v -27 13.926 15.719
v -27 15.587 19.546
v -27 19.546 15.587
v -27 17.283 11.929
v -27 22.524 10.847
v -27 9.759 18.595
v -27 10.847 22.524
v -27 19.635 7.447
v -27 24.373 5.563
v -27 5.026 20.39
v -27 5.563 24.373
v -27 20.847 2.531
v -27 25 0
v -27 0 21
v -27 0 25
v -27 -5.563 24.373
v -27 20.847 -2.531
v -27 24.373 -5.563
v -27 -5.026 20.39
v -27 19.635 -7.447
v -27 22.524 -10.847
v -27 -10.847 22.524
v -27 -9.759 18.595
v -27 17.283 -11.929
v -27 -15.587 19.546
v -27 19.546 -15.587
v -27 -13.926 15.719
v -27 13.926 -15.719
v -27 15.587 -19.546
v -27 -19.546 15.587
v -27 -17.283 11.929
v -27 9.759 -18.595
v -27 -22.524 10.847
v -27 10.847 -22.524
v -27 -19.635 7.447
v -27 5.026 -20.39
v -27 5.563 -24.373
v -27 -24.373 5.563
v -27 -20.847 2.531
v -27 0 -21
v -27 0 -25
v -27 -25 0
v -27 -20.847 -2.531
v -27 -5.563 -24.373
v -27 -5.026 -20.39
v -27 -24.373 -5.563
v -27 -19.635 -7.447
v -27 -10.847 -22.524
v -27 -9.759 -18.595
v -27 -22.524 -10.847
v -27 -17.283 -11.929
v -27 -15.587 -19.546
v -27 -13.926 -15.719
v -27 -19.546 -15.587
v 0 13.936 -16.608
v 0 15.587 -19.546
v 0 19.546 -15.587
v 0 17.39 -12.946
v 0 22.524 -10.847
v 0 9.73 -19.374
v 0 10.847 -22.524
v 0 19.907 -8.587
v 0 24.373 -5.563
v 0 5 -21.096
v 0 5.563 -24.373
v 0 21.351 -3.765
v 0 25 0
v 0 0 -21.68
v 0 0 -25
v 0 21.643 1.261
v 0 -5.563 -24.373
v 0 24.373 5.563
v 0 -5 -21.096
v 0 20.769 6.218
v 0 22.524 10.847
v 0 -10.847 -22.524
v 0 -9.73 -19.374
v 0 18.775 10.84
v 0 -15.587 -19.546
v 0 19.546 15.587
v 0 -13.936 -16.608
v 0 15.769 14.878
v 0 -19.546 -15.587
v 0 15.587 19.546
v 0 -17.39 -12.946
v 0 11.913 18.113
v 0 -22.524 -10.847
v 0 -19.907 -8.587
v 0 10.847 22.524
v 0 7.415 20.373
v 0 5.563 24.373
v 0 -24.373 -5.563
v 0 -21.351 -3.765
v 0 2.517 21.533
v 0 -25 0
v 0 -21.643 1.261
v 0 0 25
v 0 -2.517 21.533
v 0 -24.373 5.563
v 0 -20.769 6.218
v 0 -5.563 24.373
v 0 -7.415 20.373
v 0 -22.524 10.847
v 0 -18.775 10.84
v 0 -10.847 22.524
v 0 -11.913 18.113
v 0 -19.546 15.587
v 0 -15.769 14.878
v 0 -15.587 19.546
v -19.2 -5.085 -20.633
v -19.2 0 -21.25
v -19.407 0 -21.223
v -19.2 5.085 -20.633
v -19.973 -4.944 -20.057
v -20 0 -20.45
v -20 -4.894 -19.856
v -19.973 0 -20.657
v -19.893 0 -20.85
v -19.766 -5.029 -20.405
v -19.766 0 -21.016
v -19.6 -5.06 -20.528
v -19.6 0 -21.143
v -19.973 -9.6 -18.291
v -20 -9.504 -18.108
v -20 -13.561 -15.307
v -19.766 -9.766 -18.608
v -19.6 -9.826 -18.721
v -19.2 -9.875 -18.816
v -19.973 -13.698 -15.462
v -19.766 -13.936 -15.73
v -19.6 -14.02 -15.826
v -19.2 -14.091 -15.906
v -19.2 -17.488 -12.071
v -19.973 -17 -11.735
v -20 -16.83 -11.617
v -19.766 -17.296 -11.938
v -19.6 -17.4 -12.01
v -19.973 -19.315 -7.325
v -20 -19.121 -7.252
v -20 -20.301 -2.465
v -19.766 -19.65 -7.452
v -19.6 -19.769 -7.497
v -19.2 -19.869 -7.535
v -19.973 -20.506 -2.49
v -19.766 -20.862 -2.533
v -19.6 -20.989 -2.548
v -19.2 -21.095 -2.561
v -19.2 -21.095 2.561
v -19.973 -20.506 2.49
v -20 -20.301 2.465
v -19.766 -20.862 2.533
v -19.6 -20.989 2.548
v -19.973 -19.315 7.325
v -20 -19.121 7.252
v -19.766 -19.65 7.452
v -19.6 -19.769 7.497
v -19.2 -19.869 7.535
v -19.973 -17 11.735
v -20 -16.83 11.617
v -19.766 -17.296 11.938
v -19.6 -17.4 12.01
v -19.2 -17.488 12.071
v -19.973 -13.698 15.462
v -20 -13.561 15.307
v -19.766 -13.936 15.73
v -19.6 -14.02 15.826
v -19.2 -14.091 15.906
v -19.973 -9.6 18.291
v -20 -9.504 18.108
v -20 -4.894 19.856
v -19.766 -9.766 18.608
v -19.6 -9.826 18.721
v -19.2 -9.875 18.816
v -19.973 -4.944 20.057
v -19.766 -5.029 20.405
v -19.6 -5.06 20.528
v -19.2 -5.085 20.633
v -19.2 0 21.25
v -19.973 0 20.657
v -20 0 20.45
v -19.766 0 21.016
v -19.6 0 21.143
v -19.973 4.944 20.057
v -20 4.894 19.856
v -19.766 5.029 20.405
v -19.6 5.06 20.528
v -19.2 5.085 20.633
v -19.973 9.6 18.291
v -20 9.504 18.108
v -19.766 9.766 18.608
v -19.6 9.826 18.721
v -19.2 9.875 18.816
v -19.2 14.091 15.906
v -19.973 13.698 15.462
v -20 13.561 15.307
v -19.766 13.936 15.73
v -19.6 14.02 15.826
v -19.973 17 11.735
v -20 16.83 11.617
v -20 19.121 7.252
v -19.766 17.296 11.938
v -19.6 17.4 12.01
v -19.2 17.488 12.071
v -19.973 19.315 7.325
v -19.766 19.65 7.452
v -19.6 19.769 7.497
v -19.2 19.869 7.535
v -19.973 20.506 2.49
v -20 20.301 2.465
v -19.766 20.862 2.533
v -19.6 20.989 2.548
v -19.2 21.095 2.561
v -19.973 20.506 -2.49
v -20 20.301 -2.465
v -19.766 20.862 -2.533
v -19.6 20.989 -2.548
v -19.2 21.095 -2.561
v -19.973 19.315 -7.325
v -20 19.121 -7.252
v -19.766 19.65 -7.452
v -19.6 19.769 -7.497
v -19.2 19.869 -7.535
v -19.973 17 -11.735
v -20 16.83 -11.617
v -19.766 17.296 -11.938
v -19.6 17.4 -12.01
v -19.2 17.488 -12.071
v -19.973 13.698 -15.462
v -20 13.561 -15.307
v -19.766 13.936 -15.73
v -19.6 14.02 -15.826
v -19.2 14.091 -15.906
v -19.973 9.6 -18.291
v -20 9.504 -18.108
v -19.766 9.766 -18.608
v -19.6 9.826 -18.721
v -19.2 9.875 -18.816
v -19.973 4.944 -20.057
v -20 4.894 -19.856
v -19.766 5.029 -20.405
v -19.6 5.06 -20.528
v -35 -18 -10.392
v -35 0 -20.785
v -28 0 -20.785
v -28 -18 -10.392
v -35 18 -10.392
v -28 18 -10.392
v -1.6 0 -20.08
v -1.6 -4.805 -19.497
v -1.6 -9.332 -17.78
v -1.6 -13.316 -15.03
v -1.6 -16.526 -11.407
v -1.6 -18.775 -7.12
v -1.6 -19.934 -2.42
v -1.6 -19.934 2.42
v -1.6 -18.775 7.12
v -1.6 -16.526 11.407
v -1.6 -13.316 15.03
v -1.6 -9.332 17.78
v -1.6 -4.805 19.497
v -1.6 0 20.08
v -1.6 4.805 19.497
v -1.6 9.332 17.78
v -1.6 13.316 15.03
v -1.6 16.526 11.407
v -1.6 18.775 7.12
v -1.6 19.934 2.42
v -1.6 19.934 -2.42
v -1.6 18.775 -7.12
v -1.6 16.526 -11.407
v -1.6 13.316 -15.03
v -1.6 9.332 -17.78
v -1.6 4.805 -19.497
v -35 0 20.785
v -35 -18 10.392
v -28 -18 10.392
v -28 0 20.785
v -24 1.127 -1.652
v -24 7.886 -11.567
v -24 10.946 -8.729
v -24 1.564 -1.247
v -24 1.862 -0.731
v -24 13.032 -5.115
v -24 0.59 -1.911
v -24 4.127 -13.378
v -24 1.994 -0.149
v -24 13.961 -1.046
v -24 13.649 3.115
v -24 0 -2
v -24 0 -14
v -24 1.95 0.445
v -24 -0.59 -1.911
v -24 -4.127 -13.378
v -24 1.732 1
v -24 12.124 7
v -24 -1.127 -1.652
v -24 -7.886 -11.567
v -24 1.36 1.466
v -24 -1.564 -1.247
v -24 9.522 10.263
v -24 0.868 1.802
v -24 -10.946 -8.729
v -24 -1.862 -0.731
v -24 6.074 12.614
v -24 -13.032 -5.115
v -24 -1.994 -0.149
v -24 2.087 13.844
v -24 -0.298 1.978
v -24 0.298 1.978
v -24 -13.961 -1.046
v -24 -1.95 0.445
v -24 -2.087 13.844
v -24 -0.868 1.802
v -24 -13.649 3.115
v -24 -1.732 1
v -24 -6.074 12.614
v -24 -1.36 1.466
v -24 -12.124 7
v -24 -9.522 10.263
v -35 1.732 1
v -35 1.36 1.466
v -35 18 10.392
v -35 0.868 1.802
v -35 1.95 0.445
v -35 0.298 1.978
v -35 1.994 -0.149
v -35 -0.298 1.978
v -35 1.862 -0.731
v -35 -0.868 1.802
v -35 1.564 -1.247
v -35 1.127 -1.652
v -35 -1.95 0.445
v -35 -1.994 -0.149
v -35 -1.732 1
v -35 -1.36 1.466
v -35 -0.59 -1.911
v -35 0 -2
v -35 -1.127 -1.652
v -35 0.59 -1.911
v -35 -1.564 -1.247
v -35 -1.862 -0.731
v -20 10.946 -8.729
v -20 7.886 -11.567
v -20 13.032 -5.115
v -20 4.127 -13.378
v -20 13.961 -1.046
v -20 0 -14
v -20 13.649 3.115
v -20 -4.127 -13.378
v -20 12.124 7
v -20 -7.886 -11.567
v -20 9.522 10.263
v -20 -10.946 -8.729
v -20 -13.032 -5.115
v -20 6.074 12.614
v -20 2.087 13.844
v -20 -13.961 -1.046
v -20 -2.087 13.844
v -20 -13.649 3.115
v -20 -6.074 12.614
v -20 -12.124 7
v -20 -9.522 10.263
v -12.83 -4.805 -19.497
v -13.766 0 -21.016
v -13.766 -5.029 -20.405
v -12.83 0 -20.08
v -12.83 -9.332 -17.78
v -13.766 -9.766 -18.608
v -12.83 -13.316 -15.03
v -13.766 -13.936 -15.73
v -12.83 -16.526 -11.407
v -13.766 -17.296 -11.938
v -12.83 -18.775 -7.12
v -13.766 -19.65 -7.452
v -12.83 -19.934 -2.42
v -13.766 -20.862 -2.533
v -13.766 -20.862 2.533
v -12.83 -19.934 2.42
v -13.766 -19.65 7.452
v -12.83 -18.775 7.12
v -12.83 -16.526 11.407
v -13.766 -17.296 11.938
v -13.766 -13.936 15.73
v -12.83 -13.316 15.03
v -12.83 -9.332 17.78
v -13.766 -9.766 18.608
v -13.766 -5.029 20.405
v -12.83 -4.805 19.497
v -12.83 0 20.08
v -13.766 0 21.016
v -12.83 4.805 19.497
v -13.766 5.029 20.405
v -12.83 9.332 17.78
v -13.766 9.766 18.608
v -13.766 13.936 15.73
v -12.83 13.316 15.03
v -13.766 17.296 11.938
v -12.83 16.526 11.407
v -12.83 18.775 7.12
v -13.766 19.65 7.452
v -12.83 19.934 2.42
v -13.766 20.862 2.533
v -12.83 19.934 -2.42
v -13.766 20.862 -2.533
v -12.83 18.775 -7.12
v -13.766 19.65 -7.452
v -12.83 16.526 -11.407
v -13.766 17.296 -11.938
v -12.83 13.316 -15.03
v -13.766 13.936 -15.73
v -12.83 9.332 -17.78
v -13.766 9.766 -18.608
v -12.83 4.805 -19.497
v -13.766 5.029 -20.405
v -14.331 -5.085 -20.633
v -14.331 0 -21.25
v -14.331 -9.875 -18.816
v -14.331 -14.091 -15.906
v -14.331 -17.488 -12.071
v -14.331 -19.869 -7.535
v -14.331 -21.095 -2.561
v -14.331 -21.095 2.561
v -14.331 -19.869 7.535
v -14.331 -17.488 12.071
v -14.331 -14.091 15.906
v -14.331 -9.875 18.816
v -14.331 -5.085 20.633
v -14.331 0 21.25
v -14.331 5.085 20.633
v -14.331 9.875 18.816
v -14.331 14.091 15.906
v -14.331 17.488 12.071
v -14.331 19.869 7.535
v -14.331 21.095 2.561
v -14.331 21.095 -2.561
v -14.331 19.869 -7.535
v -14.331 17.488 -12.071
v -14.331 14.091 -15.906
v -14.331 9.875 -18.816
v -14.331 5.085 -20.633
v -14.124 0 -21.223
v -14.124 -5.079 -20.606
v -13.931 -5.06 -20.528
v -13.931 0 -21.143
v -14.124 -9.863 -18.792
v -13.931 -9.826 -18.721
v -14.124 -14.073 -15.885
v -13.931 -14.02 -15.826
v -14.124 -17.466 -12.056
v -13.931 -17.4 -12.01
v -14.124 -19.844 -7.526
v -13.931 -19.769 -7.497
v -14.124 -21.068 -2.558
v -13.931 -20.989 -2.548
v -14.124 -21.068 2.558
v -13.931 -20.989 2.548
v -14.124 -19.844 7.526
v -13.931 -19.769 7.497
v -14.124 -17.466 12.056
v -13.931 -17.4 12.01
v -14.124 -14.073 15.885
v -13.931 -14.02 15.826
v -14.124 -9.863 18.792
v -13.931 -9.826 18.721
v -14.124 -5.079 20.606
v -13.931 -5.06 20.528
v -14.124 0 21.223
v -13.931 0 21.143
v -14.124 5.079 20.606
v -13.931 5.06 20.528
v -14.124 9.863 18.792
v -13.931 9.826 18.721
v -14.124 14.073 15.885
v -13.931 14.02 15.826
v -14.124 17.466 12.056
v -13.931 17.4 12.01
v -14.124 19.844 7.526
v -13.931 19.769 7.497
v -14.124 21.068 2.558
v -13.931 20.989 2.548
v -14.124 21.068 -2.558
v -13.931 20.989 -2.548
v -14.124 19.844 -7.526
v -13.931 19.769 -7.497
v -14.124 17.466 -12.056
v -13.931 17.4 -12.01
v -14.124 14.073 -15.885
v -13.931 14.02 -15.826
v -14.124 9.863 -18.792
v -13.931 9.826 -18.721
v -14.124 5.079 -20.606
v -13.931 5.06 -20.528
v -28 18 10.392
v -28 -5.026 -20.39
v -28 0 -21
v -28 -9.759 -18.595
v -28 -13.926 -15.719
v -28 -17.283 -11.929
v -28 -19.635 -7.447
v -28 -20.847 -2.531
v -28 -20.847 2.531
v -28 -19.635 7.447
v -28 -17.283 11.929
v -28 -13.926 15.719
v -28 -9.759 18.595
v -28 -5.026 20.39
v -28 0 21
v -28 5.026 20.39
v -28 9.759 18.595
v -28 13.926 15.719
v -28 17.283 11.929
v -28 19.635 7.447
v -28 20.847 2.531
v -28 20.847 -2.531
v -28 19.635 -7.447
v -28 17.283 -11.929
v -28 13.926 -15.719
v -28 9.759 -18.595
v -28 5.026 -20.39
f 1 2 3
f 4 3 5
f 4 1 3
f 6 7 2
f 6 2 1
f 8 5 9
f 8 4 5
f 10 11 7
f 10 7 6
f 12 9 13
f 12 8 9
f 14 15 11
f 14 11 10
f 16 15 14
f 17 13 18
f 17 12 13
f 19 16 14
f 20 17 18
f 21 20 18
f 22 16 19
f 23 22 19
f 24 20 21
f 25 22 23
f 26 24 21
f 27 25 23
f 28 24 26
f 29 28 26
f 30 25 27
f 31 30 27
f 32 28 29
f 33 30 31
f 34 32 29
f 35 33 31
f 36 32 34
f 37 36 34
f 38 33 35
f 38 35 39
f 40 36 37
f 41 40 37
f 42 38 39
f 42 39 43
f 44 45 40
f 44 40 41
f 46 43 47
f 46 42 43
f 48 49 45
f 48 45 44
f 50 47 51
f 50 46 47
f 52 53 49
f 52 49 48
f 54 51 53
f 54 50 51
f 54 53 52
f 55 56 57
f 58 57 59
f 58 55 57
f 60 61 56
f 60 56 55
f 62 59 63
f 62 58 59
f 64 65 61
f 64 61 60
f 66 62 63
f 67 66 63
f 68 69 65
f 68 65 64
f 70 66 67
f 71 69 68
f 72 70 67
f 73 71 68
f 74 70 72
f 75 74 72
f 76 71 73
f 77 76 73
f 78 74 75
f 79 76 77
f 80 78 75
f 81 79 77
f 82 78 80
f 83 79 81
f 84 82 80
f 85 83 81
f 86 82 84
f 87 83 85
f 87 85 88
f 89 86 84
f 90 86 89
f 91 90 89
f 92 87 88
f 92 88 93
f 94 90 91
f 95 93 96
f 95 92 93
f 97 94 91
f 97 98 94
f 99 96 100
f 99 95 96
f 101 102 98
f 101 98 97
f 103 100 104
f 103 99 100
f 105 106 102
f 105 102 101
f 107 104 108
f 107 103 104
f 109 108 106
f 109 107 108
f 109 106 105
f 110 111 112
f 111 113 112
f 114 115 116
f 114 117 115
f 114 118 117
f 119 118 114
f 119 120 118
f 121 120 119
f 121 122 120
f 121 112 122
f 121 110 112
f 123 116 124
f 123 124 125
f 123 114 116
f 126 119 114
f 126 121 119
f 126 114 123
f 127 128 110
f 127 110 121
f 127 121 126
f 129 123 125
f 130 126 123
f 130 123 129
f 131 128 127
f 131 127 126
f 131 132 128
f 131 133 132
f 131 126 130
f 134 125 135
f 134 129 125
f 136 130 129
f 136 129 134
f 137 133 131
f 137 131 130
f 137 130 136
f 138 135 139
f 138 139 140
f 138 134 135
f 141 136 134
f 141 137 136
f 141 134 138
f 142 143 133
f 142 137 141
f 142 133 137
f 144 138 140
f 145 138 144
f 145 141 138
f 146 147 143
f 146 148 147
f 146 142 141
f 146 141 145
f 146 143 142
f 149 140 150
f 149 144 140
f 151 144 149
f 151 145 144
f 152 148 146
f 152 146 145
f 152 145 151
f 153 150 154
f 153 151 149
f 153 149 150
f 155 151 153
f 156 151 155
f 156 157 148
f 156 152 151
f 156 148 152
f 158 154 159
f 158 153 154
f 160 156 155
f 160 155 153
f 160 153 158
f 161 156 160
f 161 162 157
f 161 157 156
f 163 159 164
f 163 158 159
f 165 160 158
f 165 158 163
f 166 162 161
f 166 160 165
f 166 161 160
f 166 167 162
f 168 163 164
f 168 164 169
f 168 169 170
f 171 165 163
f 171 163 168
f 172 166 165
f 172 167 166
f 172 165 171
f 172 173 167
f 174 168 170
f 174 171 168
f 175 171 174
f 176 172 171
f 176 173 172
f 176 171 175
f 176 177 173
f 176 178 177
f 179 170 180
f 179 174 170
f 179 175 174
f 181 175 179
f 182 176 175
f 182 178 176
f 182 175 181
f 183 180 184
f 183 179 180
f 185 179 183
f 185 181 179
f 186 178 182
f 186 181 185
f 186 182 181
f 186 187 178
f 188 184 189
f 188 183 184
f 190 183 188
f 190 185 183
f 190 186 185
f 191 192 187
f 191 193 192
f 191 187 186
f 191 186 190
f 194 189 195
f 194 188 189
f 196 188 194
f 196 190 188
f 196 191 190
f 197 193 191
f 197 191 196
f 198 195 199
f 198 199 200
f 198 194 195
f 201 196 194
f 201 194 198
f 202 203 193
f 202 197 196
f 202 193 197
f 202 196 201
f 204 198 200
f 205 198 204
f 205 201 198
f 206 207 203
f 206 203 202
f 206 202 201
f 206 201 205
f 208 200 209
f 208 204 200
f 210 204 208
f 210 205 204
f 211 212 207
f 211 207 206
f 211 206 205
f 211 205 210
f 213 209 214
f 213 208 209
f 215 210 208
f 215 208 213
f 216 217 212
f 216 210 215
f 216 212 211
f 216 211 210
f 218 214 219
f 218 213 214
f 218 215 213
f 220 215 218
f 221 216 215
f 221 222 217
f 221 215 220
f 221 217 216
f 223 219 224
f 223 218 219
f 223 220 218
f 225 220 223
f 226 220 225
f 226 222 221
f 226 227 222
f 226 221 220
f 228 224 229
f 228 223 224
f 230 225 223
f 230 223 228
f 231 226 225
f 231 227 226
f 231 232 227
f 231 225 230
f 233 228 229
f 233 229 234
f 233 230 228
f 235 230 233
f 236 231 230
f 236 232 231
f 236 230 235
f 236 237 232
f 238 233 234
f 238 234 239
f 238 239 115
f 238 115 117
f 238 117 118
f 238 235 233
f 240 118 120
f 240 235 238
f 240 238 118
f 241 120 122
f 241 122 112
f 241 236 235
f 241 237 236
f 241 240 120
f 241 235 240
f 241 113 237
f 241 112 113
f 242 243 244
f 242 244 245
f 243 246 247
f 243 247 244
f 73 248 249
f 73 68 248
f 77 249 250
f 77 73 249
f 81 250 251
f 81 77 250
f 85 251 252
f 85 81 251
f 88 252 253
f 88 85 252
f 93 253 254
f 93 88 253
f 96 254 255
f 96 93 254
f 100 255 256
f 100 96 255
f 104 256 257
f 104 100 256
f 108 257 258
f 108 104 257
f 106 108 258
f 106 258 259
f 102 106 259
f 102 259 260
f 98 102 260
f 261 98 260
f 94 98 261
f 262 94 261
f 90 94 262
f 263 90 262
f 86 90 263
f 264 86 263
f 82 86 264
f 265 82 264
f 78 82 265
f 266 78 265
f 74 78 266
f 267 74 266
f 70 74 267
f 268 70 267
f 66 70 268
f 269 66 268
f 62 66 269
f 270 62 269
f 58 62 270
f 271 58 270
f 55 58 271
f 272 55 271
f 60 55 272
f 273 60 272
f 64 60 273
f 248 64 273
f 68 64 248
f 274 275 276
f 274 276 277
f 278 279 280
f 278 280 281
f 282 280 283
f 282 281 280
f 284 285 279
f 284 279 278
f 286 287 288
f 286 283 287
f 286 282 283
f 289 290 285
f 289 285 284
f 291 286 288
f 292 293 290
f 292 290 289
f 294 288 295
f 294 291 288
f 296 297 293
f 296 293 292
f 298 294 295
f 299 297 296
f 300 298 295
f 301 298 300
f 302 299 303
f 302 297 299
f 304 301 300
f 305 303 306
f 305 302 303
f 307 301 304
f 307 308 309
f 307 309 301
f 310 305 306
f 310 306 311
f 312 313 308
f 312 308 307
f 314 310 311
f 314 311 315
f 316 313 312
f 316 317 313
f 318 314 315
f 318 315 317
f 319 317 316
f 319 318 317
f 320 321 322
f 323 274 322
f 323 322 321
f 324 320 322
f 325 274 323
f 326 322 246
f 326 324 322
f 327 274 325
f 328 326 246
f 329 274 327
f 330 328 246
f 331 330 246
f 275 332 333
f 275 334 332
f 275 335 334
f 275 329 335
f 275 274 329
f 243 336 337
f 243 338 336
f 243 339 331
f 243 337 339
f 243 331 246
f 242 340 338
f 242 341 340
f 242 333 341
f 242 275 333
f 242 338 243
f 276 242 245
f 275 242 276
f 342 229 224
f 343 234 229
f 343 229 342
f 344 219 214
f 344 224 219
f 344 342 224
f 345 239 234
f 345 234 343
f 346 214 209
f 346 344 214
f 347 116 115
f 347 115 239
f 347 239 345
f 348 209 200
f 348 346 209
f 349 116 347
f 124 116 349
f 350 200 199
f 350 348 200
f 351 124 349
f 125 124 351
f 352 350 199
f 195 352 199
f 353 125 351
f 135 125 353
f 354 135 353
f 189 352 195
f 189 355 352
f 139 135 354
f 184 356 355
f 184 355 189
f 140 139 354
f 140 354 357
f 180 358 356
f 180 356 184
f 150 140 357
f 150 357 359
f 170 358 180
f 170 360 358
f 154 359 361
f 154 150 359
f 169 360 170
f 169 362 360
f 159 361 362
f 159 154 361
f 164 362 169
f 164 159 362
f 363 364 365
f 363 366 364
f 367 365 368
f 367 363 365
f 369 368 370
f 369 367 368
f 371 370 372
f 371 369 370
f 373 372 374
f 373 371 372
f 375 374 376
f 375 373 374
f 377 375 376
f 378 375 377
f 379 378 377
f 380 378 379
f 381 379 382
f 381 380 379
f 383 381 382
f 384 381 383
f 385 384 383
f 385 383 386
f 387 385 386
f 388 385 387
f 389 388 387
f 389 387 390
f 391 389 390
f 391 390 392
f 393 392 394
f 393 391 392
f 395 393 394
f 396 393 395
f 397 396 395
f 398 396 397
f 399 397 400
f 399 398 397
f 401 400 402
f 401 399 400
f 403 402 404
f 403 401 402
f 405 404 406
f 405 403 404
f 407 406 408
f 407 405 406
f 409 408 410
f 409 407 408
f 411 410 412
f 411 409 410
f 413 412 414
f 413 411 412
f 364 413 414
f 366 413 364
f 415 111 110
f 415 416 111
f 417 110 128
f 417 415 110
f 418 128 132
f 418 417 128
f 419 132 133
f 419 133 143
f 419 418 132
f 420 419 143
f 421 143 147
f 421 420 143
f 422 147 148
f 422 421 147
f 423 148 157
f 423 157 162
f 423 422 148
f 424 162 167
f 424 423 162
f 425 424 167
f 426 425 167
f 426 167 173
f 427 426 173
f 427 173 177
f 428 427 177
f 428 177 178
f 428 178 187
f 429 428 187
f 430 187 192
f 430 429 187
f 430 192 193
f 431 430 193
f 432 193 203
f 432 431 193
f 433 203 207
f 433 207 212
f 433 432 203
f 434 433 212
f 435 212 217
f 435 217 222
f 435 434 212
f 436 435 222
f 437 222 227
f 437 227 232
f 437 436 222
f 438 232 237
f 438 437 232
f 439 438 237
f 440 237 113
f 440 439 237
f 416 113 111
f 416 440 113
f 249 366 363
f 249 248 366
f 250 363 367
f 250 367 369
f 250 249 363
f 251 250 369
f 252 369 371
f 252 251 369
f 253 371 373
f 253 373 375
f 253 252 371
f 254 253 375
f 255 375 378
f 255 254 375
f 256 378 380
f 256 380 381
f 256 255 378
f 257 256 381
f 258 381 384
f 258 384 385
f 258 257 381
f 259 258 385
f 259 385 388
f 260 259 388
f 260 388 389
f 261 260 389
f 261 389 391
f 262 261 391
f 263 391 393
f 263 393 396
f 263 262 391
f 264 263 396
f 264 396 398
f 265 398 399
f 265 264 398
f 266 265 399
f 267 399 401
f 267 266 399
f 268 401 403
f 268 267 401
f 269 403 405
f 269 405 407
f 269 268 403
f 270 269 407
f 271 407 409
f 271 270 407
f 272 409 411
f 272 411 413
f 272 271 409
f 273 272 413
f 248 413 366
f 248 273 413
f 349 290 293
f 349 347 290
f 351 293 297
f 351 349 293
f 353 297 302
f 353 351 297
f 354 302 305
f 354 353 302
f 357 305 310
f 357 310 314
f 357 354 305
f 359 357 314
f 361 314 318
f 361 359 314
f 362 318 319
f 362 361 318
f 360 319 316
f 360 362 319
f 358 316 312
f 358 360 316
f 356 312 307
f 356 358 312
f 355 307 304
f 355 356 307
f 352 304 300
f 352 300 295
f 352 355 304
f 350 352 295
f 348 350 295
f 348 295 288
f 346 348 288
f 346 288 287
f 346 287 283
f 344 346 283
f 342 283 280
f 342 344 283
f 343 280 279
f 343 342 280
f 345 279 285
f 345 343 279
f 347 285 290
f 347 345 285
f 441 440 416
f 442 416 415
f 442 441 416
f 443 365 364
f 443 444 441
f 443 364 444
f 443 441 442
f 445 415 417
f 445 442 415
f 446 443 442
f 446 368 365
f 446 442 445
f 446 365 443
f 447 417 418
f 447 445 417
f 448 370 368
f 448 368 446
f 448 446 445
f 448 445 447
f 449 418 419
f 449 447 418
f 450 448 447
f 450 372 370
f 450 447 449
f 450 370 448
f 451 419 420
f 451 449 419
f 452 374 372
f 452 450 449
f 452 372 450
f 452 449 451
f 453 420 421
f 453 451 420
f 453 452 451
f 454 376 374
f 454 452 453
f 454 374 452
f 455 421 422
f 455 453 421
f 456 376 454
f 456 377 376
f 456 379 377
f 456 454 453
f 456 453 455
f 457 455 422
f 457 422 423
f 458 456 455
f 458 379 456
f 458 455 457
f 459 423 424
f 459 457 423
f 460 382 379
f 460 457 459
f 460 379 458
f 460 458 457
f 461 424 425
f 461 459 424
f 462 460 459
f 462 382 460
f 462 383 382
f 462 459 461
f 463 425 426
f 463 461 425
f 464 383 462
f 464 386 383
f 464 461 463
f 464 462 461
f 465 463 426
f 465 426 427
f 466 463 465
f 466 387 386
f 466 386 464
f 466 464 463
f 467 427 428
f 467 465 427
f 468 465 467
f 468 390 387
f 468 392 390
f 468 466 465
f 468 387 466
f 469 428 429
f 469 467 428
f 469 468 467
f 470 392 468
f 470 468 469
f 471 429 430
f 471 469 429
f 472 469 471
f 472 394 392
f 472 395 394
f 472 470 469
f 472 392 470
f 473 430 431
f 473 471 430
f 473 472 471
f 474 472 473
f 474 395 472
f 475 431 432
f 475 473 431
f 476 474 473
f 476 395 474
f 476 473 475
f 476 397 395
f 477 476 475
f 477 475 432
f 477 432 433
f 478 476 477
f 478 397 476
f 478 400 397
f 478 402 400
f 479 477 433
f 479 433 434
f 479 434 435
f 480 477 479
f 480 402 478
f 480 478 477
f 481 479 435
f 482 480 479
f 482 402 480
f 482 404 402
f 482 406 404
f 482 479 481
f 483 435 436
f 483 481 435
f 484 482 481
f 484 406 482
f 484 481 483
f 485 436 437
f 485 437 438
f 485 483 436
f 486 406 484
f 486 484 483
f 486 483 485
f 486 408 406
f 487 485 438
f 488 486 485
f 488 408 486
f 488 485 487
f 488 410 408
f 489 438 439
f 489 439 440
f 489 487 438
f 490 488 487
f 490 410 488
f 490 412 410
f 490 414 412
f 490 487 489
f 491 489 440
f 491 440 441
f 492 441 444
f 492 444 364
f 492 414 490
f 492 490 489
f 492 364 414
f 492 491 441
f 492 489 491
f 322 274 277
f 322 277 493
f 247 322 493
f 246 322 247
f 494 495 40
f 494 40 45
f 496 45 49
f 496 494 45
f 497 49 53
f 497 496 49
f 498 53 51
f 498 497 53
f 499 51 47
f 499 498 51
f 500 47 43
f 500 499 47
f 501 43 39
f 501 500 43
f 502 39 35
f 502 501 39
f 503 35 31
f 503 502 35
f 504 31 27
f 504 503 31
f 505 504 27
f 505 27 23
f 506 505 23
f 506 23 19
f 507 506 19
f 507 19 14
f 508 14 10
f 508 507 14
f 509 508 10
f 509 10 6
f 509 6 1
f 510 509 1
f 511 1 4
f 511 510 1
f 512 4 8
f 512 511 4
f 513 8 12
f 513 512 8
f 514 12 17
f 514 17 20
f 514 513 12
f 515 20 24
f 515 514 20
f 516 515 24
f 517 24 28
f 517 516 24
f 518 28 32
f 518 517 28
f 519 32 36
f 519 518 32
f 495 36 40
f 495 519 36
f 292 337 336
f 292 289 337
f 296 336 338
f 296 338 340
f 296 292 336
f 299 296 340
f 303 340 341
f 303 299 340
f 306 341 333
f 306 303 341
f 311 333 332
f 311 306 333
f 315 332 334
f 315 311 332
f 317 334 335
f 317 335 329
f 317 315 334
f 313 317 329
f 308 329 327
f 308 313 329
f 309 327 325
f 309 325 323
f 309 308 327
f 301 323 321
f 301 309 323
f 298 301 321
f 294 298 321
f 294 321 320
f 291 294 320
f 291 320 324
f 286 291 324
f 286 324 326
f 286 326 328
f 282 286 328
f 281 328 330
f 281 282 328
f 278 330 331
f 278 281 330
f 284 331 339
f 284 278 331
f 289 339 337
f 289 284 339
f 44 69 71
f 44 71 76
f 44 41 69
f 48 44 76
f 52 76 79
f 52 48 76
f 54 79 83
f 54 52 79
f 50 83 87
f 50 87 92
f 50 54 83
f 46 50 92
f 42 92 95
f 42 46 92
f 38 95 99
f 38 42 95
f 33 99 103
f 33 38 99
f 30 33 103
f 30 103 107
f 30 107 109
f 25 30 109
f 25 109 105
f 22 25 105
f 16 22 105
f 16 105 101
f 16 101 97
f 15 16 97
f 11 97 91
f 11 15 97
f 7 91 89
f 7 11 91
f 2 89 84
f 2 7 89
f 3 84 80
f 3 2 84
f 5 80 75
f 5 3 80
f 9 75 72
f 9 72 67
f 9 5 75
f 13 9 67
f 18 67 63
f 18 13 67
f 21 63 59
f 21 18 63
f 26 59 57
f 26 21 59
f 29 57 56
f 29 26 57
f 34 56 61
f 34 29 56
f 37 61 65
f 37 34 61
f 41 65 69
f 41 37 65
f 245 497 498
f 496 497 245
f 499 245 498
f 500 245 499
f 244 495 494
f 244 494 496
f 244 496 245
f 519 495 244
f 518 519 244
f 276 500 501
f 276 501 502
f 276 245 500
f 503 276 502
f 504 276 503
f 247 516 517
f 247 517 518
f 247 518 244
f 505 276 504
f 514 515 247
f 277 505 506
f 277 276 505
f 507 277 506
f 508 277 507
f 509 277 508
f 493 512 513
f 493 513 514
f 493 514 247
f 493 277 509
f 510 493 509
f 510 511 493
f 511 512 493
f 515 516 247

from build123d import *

# Parameters (mm, degrees)
SKETCH_4_OUTSIDE_W  = 67.78
SKETCH_4_OUTSIDE_H  = 67.78
CUT_EXTRUDE_1_DEPTH = 7


with BuildPart() as part:
    # Эскиз1 → Повернуть1 (revolve)
    with BuildSketch(Plane.XY, mode=Mode.PRIVATE) as revolve_1_sk:
        with BuildLine():
            Line((0, 21.68), (0, 25))
            Line((0, 25), (-27, 25))
            Line((-27, 25), (-27, 21))
            Line((-27, 21), (-35, 21))
            Line((-35, 21), (-35, 2))
            Line((-35, 2), (-24, 2))
            Line((-24, 2), (-24, 14))
            Line((-24, 14), (-20, 14))
            Line((-20, 14), (-20, 20.45))
            ThreePointArc((-20, 20.45), (-19.765685425, 21.015685425), (-19.2, 21.25))
            Line((-19.2, 21.25), (-14.33137085, 21.25))
            ThreePointArc((-14.33137085, 21.25), (-14.025224104, 21.189103626), (-13.765685425, 21.015685425))
            Line((-13.765685425, 21.015685425), (-12.83, 20.08))
            Line((-12.83, 20.08), (-1.6, 20.08))
            Line((-1.6, 20.08), (0, 21.68))
        make_face()
    revolve(revolve_1_sk.sketch.rotate(Axis((0, 0, 0), (-1, 0, 0)), 90), axis=Axis((0, 0, 0), (-1, 0, 0)))

    # Эскиз4 outside → Вырез-Вытянуть1 (cut)
    with BuildSketch(Plane.ZY.offset(35)):
        Rectangle(SKETCH_4_OUTSIDE_W, SKETCH_4_OUTSIDE_H)
        Polygon((20.784609691, 0), (10.392304845, 18), (-10.392304845, 18), (-20.784609691, 0), (-10.392304845, -18), (10.392304845, -18), align=None, mode=Mode.SUBTRACT)
    extrude(amount=-CUT_EXTRUDE_1_DEPTH, mode=Mode.SUBTRACT)


solid = part.part
